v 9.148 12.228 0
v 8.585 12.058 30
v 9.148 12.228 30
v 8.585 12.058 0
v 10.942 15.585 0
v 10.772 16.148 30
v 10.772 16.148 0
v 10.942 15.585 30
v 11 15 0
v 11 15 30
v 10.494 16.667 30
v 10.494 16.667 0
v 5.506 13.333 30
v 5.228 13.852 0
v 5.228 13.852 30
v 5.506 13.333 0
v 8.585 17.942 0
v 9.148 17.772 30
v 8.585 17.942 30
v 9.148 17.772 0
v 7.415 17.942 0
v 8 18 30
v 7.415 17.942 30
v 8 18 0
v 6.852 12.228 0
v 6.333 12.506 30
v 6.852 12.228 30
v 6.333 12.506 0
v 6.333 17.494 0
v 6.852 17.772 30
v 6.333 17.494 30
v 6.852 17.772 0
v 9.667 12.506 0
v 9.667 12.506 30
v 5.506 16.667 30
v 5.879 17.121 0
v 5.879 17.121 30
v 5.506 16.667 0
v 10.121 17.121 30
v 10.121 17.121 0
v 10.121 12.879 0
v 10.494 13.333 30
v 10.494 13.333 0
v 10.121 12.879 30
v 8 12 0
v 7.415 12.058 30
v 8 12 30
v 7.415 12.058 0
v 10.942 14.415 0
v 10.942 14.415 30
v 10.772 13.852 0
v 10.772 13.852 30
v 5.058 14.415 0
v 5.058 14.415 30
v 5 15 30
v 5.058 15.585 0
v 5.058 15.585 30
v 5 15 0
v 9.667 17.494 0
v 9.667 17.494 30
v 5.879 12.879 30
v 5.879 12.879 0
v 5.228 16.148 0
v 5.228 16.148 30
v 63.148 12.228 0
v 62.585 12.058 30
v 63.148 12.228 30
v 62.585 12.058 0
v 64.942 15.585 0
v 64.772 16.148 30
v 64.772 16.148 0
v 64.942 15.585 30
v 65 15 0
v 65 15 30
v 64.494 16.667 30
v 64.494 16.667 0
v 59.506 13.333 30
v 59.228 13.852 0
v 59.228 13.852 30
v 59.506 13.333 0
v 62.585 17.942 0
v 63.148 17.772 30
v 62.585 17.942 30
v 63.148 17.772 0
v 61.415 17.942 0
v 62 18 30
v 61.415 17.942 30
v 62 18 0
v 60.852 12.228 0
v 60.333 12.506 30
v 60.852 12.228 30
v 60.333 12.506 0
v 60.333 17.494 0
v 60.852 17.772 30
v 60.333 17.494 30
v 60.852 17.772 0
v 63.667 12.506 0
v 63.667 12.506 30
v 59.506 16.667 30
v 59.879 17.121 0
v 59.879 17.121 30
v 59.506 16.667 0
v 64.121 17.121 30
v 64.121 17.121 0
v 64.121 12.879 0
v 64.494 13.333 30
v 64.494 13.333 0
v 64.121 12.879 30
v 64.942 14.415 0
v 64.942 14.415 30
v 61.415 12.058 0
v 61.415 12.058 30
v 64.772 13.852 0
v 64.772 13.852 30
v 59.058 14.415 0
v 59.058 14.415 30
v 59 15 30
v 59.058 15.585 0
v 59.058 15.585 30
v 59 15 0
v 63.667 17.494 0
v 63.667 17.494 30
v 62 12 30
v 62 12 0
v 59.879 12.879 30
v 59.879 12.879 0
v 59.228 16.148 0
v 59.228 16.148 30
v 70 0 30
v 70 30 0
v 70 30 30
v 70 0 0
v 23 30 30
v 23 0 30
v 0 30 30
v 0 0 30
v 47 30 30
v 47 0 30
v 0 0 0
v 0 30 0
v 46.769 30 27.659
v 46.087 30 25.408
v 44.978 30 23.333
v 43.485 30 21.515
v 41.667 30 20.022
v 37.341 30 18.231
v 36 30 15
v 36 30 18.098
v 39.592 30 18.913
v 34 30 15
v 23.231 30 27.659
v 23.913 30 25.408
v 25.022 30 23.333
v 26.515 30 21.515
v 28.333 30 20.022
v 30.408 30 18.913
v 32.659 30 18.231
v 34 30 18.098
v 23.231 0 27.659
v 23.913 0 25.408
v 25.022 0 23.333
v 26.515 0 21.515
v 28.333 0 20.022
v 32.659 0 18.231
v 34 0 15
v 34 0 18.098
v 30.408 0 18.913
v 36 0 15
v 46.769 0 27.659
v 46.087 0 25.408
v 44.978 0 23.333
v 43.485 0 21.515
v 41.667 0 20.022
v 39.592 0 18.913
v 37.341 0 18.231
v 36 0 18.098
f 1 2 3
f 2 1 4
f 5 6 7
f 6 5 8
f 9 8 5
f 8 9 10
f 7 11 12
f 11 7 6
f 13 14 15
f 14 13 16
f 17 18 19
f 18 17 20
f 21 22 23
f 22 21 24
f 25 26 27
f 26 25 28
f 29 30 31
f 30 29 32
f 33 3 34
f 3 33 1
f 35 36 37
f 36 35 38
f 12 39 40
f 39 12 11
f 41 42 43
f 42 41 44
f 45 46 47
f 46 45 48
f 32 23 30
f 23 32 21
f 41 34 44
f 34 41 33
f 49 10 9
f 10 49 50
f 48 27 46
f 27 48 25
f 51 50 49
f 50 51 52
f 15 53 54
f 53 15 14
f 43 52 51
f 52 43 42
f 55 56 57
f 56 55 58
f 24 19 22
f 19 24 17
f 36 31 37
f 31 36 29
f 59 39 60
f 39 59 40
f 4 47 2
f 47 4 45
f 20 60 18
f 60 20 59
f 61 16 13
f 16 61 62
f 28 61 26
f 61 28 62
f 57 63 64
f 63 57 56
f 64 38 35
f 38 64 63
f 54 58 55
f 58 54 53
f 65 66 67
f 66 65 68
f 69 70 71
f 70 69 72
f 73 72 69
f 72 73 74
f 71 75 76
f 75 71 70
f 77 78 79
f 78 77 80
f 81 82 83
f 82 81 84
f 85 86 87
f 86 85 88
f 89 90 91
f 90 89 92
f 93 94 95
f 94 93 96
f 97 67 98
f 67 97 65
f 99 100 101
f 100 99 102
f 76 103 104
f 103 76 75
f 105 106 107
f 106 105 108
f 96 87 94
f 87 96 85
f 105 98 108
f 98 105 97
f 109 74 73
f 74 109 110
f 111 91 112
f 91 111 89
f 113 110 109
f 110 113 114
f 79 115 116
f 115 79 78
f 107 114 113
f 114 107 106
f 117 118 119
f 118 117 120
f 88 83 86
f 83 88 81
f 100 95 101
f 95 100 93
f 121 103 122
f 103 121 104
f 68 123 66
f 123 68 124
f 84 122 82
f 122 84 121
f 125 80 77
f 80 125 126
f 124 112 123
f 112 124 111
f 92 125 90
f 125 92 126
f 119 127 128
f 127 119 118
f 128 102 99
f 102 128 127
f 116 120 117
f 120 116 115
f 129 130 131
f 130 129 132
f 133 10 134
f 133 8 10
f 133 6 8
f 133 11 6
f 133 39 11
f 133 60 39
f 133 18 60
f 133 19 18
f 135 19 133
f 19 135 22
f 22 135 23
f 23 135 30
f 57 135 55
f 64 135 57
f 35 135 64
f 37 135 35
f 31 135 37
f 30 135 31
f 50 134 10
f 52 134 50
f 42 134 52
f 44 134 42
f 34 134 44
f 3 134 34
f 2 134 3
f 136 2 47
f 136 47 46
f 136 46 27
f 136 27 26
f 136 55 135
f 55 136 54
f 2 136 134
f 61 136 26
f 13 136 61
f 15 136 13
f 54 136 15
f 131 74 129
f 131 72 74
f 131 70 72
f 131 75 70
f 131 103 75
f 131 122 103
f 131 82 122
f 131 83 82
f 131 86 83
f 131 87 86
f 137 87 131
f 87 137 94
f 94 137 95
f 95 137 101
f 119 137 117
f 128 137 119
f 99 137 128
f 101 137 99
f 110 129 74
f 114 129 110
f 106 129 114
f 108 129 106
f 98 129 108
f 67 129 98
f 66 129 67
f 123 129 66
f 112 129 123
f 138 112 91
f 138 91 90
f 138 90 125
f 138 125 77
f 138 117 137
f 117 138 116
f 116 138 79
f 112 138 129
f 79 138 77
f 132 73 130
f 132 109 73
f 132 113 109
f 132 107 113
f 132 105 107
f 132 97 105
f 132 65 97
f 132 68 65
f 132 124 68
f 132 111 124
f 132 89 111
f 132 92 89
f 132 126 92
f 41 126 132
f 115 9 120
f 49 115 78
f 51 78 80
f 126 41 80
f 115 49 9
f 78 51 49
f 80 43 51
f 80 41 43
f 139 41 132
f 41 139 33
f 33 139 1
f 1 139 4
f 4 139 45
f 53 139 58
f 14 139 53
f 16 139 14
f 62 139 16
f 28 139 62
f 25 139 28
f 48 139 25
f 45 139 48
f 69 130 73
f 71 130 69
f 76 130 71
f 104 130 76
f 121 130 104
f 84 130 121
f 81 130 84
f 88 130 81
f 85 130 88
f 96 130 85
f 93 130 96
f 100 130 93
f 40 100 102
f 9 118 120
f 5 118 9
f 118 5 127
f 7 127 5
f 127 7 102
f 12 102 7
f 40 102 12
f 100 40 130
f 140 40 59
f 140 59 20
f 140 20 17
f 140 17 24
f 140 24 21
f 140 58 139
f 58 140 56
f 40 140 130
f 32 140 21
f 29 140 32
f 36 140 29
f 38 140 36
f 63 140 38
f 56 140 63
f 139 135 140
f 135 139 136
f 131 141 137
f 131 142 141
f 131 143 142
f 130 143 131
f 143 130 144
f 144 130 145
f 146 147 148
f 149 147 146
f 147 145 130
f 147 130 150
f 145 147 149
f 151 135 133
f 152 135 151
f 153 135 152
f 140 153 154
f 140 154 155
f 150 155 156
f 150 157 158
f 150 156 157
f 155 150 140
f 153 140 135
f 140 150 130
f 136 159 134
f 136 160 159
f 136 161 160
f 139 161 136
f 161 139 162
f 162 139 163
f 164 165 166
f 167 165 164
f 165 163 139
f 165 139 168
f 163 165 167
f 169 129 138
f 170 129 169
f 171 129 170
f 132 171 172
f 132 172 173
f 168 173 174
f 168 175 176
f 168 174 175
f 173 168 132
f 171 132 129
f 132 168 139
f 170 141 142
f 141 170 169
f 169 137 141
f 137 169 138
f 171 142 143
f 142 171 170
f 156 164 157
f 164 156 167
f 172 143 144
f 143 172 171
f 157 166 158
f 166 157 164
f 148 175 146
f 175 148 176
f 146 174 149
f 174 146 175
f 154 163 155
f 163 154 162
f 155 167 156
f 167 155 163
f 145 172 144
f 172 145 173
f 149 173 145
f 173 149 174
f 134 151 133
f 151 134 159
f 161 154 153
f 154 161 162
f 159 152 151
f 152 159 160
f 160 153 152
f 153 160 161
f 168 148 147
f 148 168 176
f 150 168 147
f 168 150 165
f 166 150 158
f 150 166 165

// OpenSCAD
$fn = 32;

// ----------------------------------------------------------------------
// Saddle clamp: split shaft clamp
// ----------------------------------------------------------------------

// --- parameters (mm) ---
blk_l = 70;               // block length, X
blk_w = 30;               // block width, Y
blk_h = 30;               // block height
clamp_r = 12;             // shaft groove radius
hole_r = 3;               // bolt hole radius
hole_m = 8;               // bolt hole margin from the ends
saw_w = 2;                // saw kerf width
fit_tol = 0.05;           // tolerance for press fits, mm
free_tol = 0.3;           // tolerance for clearance fits, mm

saw_depth = clamp_r + 3;  // saw kerf depth

difference() {
  cube([blk_l, blk_w, blk_h]);
  translate([blk_l / 2, -1, blk_h])
    rotate([-90, 0, 0])
      cylinder(h = blk_w + 2, r = clamp_r);
  for (sx = [0, 1])
    translate([sx ? blk_l - hole_m : hole_m, blk_w / 2, -1])
      cylinder(r = hole_r, h = blk_h + 2);
  translate([blk_l / 2 - saw_w / 2, -1, blk_h - saw_depth])
    cube([saw_w, blk_w + 2, saw_depth + 1]);
}
